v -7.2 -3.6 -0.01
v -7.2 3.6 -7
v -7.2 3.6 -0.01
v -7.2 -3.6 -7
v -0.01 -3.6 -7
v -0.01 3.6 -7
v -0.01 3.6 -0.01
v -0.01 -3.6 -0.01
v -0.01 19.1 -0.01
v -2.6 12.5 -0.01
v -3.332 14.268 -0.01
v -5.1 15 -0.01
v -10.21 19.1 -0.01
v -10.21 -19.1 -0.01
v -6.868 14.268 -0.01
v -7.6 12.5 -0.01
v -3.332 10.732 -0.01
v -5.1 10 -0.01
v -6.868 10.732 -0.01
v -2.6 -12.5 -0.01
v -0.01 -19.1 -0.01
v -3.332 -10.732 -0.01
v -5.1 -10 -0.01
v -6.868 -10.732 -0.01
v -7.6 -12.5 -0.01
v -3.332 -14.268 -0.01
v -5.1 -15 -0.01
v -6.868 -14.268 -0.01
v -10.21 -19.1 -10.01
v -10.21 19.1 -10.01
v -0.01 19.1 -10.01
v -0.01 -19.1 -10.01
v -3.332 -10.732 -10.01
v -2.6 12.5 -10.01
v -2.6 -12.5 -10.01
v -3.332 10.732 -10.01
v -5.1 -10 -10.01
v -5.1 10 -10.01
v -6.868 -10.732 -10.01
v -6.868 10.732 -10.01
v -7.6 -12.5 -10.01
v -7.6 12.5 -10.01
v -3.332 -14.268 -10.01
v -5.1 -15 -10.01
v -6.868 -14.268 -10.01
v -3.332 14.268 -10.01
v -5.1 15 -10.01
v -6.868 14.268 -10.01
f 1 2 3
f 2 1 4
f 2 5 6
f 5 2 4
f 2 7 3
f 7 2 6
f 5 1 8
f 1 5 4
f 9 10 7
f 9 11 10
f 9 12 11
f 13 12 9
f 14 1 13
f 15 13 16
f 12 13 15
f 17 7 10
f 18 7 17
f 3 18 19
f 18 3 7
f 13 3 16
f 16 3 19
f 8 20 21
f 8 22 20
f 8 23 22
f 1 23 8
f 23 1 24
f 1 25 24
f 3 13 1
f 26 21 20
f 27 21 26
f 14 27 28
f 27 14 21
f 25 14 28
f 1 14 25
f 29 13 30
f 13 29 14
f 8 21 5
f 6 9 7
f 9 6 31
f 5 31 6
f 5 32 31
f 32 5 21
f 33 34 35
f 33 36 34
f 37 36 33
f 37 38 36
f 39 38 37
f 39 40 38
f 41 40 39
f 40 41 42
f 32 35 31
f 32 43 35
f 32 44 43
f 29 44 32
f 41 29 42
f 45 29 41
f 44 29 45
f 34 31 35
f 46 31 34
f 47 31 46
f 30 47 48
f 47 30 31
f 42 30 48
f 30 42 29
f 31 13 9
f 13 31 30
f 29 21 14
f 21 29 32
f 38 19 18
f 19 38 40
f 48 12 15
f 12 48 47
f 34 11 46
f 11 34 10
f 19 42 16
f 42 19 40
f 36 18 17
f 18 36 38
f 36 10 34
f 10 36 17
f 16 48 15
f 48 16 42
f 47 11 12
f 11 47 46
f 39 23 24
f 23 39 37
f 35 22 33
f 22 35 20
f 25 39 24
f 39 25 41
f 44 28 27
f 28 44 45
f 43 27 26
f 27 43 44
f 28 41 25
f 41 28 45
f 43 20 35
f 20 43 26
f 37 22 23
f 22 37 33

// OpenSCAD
module SMAConnector()
{
  translate([0, 0, 3.6])
    cube([7, 7.2, 7.2], center=true);
  translate([3.6, 0, 3.6])
    rotate([0, 90, 0])
      cylinder(r=2.7, h=10);
}

module SMAHousingBlock(sides, thickness)
{
  cube_w = 7.2 + 2 * sides;
  cube_h = 7.2 + thickness;
  cube_d = 7 + thickness;
  cube_h_offset = (cube_h / 2) + 0.01;
  cube_d_offset = -((cube_d / 2) + 0.01);
  difference()
  {
    translate([cube_d_offset, 0, cube_h_offset])
      cube([cube_d, cube_w, cube_h], center=true);
    translate([-3.5, 0, 0])
      SMAConnector();
  }
}

module SMAMountingHoles(thickness, centres, radius, z_position=3.6)
{
  length = 7.2 + thickness + 2;
  translate([-length+1, centres/2, z_position])
    rotate([0, 90, 0])
      cylinder(r=radius, h=length);
  translate([-length+1, -centres/2, z_position])
    rotate([0, 90, 0])
      cylinder(r=radius, h=length);
}

module SMAMounting(thickness, centres, radius)
{
  side_width = (centres / 2) + thickness;
  holes_z_position = (7.2 + thickness) / 2;
  difference()
  {
    SMAHousingBlock(side_width, thickness);
    SMAMountingHoles(thickness, centres, radius, holes_z_position);
  }
}

rotate([0, -90, 0])
  SMAMounting(3, 25, 2.5);
